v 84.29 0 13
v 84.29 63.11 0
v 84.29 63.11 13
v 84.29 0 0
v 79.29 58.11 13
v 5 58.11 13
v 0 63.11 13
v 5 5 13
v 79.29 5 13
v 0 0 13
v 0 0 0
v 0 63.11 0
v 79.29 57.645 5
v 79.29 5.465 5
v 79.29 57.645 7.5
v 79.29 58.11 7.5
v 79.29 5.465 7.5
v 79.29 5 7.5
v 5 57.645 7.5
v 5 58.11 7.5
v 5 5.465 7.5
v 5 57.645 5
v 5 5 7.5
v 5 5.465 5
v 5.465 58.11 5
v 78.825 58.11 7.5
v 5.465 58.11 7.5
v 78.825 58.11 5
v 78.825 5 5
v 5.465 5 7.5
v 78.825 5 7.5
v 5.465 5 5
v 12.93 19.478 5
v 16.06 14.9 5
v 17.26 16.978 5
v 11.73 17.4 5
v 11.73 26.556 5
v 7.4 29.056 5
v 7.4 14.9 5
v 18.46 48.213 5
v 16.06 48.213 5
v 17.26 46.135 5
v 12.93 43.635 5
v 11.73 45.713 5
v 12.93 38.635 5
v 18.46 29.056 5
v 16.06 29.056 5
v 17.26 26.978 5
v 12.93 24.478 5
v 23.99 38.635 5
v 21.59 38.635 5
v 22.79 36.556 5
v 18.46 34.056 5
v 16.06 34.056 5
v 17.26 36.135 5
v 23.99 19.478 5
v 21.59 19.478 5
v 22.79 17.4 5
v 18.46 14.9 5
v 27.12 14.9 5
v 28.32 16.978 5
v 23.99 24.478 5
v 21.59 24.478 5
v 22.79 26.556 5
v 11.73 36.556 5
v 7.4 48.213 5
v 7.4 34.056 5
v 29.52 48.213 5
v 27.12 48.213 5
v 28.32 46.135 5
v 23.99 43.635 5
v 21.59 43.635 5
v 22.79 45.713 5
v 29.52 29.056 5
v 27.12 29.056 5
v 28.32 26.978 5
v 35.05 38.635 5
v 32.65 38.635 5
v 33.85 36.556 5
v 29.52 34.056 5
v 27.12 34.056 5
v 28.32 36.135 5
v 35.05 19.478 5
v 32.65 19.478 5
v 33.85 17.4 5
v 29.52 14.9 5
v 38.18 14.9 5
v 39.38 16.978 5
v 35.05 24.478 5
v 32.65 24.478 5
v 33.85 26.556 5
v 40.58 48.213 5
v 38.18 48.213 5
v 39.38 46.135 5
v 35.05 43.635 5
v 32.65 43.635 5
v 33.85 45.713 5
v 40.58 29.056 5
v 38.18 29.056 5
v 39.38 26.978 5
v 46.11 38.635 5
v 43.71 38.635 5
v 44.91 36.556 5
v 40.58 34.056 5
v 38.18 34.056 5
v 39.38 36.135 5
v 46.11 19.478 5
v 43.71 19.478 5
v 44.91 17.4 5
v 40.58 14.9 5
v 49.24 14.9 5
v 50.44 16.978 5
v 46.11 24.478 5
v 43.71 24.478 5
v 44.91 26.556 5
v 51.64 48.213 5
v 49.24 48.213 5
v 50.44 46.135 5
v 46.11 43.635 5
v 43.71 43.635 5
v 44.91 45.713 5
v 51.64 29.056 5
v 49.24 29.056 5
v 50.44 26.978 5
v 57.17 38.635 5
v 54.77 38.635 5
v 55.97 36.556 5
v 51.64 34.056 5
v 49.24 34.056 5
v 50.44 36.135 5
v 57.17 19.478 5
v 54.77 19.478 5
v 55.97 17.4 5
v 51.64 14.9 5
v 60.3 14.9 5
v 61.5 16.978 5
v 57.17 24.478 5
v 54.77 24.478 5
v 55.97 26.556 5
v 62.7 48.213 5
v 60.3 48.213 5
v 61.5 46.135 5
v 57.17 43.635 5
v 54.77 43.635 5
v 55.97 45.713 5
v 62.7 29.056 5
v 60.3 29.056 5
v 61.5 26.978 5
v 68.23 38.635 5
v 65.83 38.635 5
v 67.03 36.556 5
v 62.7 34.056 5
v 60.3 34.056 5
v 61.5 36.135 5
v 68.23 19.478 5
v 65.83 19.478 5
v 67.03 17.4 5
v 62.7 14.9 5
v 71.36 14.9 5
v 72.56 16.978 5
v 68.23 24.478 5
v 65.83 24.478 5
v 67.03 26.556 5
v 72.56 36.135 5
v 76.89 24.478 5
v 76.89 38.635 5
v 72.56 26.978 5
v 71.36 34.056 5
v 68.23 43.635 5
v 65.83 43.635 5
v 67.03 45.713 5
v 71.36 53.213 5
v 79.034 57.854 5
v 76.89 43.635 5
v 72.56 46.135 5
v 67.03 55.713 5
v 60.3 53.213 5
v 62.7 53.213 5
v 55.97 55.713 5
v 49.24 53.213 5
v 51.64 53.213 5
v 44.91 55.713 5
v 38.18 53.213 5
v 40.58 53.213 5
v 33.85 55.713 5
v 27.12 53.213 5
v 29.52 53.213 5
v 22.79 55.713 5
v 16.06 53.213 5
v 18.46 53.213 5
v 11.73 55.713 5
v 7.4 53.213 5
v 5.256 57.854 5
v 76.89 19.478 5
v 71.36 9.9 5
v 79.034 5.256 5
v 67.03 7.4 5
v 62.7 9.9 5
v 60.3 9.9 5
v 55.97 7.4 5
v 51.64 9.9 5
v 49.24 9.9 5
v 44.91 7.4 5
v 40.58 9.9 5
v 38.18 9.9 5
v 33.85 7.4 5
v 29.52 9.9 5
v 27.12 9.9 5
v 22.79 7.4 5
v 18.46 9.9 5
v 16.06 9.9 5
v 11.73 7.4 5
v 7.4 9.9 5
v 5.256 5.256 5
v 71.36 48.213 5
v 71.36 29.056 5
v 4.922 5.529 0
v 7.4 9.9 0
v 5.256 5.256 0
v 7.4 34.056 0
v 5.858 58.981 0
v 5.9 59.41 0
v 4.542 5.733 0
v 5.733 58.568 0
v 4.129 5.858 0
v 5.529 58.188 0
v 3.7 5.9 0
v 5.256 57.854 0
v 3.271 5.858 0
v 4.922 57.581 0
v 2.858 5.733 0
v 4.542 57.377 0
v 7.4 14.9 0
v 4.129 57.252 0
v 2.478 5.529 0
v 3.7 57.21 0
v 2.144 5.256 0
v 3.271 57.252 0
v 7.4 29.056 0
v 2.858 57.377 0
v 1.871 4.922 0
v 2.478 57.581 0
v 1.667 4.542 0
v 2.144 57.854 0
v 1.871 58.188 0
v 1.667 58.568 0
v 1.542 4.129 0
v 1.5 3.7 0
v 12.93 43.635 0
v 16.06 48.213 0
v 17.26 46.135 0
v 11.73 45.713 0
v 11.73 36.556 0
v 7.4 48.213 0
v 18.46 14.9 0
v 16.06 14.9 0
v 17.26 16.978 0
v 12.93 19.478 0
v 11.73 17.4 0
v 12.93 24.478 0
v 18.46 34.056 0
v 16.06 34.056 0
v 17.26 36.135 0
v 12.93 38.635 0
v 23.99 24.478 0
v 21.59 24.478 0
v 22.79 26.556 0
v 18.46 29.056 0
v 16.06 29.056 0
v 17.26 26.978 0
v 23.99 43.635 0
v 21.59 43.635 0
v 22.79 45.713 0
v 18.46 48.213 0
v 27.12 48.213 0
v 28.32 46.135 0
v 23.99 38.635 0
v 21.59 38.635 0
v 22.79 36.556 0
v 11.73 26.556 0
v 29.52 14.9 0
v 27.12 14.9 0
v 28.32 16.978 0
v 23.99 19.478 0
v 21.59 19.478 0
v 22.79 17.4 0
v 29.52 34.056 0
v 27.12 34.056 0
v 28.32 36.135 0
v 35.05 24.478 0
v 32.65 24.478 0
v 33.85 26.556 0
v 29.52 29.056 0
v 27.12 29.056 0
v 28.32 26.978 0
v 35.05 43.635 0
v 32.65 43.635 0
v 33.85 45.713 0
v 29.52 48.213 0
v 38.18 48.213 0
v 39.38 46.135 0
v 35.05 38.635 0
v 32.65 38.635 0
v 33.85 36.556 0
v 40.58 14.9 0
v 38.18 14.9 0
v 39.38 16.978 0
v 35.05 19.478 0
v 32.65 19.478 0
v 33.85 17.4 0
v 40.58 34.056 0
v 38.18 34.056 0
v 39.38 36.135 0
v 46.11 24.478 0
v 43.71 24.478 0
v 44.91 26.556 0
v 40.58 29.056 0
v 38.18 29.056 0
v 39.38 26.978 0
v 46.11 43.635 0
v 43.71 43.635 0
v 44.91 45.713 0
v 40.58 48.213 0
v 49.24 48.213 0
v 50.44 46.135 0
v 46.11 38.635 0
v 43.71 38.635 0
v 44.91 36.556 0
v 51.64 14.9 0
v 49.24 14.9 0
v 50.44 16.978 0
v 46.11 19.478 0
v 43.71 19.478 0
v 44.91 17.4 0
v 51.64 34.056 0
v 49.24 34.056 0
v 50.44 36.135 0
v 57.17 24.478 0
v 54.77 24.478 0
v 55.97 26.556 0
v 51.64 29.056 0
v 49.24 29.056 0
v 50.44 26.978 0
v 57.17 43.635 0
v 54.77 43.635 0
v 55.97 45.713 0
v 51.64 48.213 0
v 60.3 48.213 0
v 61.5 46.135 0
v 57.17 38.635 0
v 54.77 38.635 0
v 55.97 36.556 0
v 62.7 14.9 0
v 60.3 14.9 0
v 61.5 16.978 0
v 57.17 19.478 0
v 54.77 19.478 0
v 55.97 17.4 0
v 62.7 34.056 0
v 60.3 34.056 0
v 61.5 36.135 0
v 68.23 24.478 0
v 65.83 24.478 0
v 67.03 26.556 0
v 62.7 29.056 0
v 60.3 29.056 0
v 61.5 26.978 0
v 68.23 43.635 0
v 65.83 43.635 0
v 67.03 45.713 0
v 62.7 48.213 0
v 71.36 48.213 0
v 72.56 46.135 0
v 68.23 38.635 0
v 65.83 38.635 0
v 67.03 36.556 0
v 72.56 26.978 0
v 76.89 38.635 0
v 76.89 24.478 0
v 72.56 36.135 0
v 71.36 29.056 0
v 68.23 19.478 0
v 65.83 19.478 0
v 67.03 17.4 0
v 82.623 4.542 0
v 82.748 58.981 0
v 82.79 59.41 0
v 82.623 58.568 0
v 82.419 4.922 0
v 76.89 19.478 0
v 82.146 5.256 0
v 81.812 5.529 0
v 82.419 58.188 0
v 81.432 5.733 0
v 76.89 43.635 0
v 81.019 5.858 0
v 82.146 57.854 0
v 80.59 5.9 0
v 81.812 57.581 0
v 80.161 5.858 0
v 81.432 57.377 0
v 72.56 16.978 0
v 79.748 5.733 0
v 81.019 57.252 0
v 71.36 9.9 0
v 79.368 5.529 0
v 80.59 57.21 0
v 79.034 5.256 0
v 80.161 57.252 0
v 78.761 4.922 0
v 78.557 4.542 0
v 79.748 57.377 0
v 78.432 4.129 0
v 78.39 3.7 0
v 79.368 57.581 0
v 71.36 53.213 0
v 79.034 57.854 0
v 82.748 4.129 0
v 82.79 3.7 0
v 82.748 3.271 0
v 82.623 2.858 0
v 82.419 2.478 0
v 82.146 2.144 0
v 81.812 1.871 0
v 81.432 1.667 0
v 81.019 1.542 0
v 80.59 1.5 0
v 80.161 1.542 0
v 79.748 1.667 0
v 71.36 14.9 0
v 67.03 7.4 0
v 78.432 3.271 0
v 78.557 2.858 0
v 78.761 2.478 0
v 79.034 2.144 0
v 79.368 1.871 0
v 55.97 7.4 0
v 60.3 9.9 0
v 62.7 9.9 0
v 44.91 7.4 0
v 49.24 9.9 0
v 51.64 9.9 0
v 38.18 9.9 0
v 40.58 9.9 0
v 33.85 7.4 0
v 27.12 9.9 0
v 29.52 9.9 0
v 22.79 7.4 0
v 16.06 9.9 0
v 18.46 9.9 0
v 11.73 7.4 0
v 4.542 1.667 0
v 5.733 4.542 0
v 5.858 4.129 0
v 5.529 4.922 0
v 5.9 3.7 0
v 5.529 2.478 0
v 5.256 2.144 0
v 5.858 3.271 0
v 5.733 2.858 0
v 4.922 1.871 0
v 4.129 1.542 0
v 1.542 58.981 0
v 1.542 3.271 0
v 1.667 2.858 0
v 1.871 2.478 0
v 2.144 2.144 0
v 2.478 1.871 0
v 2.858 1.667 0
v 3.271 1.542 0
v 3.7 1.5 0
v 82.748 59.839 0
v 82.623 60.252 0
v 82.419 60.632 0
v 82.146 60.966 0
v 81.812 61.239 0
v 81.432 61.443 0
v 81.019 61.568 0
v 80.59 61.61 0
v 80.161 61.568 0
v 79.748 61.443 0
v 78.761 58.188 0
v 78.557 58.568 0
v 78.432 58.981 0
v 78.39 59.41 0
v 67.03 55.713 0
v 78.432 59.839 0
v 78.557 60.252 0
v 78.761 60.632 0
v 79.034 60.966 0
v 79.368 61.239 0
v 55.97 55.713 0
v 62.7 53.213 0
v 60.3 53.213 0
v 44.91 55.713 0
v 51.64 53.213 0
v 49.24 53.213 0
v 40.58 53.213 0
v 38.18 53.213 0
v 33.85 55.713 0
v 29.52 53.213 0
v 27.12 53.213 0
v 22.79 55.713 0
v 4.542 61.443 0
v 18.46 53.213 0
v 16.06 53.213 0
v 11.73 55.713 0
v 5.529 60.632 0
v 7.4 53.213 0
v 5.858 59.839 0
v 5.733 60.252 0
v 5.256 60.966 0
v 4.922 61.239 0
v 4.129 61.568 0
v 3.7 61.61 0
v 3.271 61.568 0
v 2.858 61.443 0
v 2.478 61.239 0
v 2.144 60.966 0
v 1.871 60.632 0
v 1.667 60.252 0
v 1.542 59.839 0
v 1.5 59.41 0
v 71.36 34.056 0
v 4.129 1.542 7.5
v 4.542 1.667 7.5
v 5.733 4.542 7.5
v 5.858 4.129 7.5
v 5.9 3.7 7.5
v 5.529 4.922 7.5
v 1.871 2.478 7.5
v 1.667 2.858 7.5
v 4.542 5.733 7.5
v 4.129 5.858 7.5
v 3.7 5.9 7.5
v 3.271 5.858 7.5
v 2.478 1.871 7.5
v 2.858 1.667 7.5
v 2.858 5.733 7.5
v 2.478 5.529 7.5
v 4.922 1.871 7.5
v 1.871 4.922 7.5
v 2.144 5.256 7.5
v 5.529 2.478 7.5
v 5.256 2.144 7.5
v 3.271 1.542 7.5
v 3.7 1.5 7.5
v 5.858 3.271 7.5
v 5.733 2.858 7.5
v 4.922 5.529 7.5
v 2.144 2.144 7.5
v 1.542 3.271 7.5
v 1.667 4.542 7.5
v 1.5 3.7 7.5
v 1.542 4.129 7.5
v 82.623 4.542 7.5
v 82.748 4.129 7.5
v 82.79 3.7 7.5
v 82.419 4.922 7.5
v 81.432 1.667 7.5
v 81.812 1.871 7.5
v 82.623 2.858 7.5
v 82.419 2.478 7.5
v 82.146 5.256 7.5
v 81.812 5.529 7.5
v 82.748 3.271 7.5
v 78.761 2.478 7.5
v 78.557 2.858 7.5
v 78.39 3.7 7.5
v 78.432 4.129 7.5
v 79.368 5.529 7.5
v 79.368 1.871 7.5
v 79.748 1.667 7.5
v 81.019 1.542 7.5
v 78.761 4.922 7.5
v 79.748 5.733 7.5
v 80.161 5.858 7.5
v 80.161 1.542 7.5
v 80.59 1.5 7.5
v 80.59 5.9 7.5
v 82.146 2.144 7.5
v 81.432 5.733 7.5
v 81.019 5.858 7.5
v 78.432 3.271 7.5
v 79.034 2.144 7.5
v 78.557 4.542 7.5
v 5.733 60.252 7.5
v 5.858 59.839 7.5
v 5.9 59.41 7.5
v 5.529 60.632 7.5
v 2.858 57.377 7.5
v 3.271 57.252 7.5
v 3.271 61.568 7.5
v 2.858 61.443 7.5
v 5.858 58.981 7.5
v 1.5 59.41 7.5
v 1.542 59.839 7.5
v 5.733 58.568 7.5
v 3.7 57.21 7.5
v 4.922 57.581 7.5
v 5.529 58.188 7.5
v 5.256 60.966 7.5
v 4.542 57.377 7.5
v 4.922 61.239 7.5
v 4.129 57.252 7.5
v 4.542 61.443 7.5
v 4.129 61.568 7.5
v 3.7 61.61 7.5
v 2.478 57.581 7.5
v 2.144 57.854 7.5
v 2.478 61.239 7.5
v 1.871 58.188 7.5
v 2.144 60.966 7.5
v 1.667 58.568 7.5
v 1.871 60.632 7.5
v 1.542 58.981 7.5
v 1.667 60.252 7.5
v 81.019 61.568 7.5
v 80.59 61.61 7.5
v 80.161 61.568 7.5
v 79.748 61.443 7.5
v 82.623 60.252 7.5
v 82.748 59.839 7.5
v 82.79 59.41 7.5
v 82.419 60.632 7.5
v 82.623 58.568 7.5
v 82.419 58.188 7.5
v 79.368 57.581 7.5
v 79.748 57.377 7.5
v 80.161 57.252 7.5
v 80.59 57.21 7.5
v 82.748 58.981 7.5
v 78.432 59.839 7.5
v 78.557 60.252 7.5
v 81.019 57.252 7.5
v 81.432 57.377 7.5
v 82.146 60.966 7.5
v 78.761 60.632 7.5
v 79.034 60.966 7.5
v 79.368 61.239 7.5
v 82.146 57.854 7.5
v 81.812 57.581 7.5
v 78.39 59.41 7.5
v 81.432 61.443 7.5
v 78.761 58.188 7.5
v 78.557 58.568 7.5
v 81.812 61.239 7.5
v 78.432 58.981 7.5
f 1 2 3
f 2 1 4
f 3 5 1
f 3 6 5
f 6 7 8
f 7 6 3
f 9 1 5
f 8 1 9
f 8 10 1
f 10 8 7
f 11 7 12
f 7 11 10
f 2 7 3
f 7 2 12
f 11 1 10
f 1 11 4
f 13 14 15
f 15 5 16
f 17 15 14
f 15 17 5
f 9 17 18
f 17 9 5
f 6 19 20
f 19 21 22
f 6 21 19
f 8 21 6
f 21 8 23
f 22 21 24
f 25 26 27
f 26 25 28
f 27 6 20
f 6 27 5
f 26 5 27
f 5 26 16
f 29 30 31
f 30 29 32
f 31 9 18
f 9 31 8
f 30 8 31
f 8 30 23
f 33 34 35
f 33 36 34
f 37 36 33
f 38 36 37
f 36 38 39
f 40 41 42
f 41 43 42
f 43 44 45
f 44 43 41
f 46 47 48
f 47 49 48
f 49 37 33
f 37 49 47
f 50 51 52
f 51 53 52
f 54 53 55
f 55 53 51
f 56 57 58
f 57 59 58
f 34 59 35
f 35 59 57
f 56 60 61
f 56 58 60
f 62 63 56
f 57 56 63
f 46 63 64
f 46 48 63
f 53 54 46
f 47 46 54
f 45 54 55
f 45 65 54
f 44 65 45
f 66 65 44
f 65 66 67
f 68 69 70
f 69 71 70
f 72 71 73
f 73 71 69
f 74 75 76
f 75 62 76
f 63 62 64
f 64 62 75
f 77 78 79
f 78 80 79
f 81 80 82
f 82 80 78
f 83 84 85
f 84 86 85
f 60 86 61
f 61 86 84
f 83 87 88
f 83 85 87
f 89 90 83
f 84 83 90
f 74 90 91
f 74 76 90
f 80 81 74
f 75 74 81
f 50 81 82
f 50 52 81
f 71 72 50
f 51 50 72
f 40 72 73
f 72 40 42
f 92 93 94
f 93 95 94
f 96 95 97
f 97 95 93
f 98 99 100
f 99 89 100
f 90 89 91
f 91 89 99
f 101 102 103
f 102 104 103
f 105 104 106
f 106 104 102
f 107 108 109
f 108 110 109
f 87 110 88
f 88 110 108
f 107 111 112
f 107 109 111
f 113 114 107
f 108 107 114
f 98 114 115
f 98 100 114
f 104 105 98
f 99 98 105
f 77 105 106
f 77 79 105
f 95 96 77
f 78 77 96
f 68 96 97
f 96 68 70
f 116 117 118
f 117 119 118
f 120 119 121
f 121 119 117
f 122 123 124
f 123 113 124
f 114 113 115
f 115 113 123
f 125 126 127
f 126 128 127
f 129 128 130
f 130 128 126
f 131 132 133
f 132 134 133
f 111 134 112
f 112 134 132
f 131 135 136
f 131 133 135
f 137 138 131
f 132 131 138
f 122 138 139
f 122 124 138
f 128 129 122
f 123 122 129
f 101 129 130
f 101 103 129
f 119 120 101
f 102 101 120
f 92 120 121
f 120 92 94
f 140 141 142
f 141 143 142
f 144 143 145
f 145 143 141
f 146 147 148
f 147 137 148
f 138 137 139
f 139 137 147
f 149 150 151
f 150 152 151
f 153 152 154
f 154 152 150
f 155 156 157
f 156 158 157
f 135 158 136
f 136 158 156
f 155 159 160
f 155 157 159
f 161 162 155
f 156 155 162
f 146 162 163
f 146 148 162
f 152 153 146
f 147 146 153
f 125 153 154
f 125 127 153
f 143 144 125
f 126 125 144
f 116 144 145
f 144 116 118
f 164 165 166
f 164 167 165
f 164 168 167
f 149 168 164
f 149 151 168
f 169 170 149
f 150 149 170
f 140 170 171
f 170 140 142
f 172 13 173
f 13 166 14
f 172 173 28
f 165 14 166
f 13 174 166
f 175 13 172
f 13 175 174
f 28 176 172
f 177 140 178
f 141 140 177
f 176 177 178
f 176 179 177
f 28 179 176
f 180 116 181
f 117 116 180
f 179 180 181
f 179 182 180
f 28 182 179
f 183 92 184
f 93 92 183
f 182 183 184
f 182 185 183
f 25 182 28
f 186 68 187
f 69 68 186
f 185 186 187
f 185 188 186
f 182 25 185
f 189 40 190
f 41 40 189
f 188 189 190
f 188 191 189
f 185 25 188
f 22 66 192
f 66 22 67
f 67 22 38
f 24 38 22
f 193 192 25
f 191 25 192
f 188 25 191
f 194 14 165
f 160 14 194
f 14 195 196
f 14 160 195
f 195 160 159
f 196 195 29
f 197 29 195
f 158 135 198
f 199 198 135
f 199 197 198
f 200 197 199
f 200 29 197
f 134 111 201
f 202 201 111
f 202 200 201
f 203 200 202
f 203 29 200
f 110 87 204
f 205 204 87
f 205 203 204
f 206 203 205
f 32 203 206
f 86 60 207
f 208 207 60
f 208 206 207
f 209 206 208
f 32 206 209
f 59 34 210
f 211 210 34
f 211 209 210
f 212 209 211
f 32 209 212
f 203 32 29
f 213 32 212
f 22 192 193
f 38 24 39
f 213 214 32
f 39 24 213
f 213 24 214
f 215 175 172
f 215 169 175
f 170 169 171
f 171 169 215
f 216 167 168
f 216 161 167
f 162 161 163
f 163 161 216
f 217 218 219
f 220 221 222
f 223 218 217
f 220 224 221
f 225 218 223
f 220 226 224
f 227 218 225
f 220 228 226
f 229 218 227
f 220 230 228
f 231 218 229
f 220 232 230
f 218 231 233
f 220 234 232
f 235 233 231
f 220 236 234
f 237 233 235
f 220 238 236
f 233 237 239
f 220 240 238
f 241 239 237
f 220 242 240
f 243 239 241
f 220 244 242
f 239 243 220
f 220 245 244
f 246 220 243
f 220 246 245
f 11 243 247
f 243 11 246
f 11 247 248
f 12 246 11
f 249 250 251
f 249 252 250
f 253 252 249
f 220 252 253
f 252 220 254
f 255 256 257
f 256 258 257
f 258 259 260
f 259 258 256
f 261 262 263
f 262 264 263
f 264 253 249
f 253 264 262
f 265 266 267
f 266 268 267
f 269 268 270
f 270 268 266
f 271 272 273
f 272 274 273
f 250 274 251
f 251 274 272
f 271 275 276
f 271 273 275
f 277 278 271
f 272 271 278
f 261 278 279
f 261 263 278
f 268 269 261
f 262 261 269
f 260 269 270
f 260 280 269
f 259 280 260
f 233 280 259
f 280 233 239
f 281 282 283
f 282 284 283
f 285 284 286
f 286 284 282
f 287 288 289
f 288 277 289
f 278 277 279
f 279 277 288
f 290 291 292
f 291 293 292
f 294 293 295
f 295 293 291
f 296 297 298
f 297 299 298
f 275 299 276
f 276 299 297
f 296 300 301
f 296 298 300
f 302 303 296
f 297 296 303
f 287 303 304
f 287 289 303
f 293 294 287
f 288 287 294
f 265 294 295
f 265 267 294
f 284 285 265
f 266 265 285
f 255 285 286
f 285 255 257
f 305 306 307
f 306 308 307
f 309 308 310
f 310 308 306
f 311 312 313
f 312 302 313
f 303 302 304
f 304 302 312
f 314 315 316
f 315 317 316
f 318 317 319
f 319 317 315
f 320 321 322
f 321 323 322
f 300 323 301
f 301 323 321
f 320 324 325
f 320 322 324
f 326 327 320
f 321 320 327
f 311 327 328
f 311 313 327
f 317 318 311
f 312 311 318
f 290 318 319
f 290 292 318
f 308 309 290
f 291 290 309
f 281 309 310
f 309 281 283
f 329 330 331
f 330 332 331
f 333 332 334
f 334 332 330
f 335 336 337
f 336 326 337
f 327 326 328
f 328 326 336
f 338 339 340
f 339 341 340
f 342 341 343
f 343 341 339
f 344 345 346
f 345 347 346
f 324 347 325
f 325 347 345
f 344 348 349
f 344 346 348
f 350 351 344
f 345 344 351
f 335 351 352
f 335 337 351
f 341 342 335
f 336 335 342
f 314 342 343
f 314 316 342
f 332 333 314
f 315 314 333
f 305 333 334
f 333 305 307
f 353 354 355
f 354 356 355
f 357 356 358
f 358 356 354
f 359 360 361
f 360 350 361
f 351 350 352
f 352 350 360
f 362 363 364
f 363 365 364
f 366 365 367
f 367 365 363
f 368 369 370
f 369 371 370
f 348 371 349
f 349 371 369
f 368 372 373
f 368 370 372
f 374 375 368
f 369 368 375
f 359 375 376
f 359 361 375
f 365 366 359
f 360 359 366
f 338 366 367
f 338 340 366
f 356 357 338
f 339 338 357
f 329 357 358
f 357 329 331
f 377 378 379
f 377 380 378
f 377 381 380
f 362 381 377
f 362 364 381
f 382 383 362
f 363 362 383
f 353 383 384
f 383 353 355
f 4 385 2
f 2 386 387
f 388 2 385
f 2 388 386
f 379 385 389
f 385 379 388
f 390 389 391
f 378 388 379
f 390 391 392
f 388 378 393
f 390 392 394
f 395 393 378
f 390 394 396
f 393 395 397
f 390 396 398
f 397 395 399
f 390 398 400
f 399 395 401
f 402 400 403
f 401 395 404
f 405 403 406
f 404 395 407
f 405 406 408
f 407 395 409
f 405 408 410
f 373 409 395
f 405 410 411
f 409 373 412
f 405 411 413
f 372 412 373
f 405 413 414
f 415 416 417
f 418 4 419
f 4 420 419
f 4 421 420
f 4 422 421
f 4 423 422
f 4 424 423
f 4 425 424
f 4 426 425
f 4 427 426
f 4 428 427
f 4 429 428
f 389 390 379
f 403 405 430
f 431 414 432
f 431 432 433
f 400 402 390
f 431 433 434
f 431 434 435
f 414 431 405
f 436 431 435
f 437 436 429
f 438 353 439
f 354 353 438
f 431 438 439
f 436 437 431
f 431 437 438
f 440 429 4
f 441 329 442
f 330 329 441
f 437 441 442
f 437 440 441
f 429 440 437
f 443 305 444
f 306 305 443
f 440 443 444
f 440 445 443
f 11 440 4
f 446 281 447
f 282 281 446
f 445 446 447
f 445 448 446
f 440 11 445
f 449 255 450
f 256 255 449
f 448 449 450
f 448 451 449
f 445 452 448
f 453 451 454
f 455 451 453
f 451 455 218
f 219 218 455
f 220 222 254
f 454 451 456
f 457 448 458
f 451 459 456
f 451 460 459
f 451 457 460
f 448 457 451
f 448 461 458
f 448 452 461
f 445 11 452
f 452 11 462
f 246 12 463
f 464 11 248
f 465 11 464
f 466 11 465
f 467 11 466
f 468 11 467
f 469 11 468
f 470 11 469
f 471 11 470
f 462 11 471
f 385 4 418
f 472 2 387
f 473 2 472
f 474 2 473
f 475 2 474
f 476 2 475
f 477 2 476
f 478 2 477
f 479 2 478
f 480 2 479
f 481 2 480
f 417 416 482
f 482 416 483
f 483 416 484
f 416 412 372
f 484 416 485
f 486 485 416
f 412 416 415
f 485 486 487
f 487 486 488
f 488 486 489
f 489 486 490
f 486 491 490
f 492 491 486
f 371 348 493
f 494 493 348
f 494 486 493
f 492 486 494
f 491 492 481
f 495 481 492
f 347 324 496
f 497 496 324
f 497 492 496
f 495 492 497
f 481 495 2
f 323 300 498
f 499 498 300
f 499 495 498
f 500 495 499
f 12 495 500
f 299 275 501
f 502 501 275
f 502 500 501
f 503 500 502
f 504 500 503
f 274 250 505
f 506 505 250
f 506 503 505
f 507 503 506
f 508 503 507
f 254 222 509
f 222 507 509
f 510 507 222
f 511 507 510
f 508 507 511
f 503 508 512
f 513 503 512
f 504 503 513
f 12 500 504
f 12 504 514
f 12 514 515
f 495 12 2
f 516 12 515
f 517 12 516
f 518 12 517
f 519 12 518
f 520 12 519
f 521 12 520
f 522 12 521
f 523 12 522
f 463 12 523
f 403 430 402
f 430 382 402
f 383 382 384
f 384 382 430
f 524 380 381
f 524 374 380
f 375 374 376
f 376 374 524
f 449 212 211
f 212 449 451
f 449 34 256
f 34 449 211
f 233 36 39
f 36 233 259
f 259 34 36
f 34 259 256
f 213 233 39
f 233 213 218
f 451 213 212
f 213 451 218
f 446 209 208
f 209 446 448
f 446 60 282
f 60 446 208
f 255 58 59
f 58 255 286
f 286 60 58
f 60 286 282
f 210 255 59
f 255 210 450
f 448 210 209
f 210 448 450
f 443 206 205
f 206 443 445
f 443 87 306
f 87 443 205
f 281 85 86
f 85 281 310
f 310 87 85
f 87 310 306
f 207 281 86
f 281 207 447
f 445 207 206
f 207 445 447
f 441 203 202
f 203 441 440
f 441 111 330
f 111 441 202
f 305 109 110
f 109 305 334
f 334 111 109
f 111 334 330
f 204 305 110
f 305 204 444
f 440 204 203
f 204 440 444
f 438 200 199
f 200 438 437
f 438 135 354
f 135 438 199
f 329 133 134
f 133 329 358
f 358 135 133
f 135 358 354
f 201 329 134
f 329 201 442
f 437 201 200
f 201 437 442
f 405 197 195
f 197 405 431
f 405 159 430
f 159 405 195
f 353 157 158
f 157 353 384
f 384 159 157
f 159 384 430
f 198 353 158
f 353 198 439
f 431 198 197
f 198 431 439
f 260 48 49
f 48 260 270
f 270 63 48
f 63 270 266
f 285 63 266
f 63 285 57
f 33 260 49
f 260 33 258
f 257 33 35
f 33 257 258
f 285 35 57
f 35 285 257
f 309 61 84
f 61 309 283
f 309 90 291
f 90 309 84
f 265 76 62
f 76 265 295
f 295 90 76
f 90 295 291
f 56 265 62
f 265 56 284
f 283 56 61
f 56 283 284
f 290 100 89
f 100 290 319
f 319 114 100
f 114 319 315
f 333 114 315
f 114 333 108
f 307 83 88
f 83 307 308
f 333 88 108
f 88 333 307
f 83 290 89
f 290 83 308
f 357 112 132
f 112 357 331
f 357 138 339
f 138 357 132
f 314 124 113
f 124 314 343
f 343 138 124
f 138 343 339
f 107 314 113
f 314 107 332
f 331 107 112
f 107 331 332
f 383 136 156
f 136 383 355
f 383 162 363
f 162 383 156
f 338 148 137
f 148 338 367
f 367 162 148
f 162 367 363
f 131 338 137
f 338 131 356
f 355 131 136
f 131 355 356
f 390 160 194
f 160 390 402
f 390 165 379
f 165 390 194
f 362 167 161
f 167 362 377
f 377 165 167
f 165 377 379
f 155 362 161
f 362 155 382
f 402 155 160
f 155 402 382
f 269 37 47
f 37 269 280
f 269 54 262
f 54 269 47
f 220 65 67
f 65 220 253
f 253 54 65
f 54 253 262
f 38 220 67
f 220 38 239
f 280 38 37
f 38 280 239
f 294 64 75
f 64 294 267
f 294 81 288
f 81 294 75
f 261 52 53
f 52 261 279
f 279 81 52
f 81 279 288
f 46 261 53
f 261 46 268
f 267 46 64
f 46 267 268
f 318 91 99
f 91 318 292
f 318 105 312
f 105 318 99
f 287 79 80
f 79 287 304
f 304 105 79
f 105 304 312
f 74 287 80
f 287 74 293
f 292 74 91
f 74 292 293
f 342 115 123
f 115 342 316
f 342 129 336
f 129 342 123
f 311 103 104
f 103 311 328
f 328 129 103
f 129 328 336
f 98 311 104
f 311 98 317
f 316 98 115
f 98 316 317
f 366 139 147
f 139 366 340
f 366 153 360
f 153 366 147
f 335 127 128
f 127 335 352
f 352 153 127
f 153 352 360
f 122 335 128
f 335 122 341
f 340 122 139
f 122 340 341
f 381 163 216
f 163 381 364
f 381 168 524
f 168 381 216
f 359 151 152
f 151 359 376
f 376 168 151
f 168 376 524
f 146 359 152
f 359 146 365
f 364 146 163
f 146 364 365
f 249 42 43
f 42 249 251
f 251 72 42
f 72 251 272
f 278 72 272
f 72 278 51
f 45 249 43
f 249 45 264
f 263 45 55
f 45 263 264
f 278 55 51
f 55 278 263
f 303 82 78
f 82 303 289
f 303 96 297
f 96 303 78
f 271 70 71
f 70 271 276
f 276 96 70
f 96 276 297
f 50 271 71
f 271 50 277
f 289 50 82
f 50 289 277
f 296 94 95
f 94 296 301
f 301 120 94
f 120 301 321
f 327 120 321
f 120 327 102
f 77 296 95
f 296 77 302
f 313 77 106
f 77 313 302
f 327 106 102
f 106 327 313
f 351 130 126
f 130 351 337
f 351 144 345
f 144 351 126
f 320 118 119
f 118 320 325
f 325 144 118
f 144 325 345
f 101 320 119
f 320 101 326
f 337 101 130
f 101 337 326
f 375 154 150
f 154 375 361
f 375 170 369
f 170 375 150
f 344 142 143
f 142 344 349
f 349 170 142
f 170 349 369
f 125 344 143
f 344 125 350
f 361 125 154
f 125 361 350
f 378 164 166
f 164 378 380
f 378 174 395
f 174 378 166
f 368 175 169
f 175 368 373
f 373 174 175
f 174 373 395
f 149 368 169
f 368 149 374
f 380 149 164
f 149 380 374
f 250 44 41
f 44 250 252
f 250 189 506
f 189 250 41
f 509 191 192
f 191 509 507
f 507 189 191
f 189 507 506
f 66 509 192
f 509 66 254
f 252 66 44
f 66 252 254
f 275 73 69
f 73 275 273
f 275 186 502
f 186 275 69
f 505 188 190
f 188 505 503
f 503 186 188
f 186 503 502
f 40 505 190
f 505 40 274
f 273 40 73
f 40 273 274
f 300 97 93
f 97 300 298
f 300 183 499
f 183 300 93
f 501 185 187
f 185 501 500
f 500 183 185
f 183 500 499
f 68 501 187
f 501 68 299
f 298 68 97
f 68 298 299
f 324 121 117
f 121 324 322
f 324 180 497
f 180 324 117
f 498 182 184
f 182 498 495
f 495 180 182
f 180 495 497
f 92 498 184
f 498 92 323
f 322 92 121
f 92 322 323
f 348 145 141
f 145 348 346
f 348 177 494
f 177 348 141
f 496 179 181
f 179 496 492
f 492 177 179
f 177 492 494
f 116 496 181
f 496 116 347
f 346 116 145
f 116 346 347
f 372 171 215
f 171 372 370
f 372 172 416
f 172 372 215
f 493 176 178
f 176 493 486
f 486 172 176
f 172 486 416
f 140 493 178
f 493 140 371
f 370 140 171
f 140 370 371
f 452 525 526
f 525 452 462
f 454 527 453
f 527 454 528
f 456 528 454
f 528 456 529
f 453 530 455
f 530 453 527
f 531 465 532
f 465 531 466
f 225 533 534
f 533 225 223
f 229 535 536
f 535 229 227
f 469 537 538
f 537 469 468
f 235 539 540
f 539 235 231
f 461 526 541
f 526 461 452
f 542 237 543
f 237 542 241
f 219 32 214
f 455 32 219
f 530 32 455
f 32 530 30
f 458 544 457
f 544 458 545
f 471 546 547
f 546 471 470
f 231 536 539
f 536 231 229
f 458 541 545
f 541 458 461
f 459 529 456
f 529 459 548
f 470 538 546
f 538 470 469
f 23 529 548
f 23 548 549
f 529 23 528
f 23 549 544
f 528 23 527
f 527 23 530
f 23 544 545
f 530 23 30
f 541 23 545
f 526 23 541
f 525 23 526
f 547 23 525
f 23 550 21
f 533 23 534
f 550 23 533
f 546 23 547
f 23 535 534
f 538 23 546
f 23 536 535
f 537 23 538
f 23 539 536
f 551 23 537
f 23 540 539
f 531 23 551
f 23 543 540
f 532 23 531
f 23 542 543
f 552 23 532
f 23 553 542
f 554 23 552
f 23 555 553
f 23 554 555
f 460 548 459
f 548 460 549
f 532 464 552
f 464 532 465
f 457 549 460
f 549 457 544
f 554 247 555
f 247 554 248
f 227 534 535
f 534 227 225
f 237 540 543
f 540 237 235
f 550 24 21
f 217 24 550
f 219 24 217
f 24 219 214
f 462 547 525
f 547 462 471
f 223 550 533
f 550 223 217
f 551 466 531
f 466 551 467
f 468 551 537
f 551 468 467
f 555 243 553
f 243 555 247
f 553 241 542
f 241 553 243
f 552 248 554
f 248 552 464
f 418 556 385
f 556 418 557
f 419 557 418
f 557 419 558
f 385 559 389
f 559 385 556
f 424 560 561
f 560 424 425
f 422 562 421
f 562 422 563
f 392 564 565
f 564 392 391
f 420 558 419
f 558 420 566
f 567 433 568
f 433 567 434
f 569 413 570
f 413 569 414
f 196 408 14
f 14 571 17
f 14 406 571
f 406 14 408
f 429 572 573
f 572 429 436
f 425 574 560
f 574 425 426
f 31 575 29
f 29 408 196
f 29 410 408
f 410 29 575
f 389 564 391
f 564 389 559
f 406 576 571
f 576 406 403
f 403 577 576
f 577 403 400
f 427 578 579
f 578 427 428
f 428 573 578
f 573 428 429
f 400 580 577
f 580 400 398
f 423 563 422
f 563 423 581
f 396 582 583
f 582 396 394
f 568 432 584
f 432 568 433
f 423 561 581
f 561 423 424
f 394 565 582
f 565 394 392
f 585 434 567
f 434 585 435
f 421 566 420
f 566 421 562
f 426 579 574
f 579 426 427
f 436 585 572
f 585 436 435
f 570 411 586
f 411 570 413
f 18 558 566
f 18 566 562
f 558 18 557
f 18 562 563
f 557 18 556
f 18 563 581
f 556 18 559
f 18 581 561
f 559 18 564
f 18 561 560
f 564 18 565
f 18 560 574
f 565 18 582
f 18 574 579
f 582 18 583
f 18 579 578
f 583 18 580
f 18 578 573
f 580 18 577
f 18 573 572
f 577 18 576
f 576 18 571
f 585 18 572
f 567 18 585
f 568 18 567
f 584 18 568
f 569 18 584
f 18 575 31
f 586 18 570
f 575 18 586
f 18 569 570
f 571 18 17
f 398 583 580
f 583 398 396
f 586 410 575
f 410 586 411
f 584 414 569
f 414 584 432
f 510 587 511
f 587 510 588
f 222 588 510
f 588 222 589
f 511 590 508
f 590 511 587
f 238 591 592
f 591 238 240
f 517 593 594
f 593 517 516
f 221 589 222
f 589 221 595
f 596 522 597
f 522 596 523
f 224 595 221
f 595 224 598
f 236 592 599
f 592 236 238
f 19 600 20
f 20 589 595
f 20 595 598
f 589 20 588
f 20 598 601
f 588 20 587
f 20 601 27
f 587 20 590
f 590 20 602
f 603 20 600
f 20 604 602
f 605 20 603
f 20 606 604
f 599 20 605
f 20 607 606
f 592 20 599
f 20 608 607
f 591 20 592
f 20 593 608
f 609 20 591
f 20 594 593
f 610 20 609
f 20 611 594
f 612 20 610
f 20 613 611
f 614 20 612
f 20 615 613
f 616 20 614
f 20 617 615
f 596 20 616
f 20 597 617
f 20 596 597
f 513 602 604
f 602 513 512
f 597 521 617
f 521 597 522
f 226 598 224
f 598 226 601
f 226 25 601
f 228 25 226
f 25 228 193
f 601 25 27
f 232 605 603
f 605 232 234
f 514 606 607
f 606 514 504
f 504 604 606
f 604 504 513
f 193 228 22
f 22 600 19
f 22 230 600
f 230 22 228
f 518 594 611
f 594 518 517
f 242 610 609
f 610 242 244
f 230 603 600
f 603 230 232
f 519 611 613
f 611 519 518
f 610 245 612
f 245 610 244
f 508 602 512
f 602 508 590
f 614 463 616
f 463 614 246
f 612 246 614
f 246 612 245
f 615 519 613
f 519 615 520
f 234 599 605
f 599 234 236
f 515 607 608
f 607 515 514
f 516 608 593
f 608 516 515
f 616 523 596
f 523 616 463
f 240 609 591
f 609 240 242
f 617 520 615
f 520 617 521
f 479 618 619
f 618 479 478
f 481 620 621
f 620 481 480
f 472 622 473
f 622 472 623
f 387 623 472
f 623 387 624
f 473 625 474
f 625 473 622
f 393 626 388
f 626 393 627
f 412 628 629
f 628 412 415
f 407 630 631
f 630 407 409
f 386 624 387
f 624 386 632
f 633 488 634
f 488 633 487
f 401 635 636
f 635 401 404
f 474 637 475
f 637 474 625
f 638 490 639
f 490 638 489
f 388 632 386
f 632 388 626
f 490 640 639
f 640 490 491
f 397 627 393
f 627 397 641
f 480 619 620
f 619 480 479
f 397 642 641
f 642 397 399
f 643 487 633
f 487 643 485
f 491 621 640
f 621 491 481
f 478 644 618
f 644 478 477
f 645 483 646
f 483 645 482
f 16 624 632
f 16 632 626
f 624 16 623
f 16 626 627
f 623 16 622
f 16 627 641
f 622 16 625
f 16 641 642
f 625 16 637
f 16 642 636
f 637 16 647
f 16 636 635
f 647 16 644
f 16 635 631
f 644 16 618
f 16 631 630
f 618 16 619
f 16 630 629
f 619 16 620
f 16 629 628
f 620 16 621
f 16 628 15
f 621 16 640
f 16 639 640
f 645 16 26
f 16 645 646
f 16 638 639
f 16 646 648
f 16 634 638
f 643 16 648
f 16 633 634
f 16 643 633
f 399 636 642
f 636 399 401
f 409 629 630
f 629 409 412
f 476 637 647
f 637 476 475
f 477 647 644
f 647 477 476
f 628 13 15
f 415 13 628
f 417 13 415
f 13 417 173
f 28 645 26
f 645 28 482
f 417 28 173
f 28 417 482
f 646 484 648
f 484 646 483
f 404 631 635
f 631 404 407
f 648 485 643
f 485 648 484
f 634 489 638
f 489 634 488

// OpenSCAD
$fn = 32;

// ----------------------------------------------------------------------
// Honeycomb panel: 84.29 x 63.11 mm, 30 cells of 10 mm
// ----------------------------------------------------------------------

// --- parameters (mm) ---
panel_w = 84.29;          // panel width
panel_d = 63.11;          // panel depth
thick = 5;                // panel thickness
cell_r = 5;               // hex cell circumradius
pitch = 11.06;            // hex cell pitch (centre to centre)
web = 2.4;                // web between the cells
columns = 6;              // columns of cells
rows = 5;                 // rows of cells
cell_count = 30;          // total cells
shift_x = 11.73;          // first cell offset in x
shift_y = 12.4;           // first cell offset in y
mount_d = 4.4;            // corner mounting holes
hole_off = 3.7;           // mounting hole offset from the corners
rim_h = 13;               // rim height
rim_t = 5;                // rim wall thickness

difference() {
  union() {
    cube([panel_w, panel_d, thick]);
    /* rim around the panel, sunk 1 mm into the plate */
    translate([0, 0, thick - 1]) difference() {
      cube([panel_w, panel_d, rim_h - thick + 1]);
      translate([rim_t, rim_t, -2.5]) cube([panel_w - 2 * rim_t, panel_d - 2 * rim_t, rim_h - thick + 6]);
    }
  }
  /* hexagonal cells, point-up, cut right through the plate */
  for (row = [0 : rows - 1]) {
    for (col = [0 : columns - 1]) {
      translate([shift_x + col * pitch + (row % 2) * pitch / 2, shift_y + row * pitch * 0.866025, -2.5]) rotate([0, 0, 30]) cylinder(h = thick + 5, d = 2 * cell_r, $fn = 6);
    }
  }
  /* corner mounting holes, clear of the outer cell web */
  translate([3.7, 3.7, -2.5]) cylinder(h = thick + 5, d = mount_d);
  translate([80.59, 3.7, -2.5]) cylinder(h = thick + 5, d = mount_d);
  translate([3.7, 59.41, -2.5]) cylinder(h = thick + 5, d = mount_d);
  translate([80.59, 59.41, -2.5]) cylinder(h = thick + 5, d = mount_d);
}
